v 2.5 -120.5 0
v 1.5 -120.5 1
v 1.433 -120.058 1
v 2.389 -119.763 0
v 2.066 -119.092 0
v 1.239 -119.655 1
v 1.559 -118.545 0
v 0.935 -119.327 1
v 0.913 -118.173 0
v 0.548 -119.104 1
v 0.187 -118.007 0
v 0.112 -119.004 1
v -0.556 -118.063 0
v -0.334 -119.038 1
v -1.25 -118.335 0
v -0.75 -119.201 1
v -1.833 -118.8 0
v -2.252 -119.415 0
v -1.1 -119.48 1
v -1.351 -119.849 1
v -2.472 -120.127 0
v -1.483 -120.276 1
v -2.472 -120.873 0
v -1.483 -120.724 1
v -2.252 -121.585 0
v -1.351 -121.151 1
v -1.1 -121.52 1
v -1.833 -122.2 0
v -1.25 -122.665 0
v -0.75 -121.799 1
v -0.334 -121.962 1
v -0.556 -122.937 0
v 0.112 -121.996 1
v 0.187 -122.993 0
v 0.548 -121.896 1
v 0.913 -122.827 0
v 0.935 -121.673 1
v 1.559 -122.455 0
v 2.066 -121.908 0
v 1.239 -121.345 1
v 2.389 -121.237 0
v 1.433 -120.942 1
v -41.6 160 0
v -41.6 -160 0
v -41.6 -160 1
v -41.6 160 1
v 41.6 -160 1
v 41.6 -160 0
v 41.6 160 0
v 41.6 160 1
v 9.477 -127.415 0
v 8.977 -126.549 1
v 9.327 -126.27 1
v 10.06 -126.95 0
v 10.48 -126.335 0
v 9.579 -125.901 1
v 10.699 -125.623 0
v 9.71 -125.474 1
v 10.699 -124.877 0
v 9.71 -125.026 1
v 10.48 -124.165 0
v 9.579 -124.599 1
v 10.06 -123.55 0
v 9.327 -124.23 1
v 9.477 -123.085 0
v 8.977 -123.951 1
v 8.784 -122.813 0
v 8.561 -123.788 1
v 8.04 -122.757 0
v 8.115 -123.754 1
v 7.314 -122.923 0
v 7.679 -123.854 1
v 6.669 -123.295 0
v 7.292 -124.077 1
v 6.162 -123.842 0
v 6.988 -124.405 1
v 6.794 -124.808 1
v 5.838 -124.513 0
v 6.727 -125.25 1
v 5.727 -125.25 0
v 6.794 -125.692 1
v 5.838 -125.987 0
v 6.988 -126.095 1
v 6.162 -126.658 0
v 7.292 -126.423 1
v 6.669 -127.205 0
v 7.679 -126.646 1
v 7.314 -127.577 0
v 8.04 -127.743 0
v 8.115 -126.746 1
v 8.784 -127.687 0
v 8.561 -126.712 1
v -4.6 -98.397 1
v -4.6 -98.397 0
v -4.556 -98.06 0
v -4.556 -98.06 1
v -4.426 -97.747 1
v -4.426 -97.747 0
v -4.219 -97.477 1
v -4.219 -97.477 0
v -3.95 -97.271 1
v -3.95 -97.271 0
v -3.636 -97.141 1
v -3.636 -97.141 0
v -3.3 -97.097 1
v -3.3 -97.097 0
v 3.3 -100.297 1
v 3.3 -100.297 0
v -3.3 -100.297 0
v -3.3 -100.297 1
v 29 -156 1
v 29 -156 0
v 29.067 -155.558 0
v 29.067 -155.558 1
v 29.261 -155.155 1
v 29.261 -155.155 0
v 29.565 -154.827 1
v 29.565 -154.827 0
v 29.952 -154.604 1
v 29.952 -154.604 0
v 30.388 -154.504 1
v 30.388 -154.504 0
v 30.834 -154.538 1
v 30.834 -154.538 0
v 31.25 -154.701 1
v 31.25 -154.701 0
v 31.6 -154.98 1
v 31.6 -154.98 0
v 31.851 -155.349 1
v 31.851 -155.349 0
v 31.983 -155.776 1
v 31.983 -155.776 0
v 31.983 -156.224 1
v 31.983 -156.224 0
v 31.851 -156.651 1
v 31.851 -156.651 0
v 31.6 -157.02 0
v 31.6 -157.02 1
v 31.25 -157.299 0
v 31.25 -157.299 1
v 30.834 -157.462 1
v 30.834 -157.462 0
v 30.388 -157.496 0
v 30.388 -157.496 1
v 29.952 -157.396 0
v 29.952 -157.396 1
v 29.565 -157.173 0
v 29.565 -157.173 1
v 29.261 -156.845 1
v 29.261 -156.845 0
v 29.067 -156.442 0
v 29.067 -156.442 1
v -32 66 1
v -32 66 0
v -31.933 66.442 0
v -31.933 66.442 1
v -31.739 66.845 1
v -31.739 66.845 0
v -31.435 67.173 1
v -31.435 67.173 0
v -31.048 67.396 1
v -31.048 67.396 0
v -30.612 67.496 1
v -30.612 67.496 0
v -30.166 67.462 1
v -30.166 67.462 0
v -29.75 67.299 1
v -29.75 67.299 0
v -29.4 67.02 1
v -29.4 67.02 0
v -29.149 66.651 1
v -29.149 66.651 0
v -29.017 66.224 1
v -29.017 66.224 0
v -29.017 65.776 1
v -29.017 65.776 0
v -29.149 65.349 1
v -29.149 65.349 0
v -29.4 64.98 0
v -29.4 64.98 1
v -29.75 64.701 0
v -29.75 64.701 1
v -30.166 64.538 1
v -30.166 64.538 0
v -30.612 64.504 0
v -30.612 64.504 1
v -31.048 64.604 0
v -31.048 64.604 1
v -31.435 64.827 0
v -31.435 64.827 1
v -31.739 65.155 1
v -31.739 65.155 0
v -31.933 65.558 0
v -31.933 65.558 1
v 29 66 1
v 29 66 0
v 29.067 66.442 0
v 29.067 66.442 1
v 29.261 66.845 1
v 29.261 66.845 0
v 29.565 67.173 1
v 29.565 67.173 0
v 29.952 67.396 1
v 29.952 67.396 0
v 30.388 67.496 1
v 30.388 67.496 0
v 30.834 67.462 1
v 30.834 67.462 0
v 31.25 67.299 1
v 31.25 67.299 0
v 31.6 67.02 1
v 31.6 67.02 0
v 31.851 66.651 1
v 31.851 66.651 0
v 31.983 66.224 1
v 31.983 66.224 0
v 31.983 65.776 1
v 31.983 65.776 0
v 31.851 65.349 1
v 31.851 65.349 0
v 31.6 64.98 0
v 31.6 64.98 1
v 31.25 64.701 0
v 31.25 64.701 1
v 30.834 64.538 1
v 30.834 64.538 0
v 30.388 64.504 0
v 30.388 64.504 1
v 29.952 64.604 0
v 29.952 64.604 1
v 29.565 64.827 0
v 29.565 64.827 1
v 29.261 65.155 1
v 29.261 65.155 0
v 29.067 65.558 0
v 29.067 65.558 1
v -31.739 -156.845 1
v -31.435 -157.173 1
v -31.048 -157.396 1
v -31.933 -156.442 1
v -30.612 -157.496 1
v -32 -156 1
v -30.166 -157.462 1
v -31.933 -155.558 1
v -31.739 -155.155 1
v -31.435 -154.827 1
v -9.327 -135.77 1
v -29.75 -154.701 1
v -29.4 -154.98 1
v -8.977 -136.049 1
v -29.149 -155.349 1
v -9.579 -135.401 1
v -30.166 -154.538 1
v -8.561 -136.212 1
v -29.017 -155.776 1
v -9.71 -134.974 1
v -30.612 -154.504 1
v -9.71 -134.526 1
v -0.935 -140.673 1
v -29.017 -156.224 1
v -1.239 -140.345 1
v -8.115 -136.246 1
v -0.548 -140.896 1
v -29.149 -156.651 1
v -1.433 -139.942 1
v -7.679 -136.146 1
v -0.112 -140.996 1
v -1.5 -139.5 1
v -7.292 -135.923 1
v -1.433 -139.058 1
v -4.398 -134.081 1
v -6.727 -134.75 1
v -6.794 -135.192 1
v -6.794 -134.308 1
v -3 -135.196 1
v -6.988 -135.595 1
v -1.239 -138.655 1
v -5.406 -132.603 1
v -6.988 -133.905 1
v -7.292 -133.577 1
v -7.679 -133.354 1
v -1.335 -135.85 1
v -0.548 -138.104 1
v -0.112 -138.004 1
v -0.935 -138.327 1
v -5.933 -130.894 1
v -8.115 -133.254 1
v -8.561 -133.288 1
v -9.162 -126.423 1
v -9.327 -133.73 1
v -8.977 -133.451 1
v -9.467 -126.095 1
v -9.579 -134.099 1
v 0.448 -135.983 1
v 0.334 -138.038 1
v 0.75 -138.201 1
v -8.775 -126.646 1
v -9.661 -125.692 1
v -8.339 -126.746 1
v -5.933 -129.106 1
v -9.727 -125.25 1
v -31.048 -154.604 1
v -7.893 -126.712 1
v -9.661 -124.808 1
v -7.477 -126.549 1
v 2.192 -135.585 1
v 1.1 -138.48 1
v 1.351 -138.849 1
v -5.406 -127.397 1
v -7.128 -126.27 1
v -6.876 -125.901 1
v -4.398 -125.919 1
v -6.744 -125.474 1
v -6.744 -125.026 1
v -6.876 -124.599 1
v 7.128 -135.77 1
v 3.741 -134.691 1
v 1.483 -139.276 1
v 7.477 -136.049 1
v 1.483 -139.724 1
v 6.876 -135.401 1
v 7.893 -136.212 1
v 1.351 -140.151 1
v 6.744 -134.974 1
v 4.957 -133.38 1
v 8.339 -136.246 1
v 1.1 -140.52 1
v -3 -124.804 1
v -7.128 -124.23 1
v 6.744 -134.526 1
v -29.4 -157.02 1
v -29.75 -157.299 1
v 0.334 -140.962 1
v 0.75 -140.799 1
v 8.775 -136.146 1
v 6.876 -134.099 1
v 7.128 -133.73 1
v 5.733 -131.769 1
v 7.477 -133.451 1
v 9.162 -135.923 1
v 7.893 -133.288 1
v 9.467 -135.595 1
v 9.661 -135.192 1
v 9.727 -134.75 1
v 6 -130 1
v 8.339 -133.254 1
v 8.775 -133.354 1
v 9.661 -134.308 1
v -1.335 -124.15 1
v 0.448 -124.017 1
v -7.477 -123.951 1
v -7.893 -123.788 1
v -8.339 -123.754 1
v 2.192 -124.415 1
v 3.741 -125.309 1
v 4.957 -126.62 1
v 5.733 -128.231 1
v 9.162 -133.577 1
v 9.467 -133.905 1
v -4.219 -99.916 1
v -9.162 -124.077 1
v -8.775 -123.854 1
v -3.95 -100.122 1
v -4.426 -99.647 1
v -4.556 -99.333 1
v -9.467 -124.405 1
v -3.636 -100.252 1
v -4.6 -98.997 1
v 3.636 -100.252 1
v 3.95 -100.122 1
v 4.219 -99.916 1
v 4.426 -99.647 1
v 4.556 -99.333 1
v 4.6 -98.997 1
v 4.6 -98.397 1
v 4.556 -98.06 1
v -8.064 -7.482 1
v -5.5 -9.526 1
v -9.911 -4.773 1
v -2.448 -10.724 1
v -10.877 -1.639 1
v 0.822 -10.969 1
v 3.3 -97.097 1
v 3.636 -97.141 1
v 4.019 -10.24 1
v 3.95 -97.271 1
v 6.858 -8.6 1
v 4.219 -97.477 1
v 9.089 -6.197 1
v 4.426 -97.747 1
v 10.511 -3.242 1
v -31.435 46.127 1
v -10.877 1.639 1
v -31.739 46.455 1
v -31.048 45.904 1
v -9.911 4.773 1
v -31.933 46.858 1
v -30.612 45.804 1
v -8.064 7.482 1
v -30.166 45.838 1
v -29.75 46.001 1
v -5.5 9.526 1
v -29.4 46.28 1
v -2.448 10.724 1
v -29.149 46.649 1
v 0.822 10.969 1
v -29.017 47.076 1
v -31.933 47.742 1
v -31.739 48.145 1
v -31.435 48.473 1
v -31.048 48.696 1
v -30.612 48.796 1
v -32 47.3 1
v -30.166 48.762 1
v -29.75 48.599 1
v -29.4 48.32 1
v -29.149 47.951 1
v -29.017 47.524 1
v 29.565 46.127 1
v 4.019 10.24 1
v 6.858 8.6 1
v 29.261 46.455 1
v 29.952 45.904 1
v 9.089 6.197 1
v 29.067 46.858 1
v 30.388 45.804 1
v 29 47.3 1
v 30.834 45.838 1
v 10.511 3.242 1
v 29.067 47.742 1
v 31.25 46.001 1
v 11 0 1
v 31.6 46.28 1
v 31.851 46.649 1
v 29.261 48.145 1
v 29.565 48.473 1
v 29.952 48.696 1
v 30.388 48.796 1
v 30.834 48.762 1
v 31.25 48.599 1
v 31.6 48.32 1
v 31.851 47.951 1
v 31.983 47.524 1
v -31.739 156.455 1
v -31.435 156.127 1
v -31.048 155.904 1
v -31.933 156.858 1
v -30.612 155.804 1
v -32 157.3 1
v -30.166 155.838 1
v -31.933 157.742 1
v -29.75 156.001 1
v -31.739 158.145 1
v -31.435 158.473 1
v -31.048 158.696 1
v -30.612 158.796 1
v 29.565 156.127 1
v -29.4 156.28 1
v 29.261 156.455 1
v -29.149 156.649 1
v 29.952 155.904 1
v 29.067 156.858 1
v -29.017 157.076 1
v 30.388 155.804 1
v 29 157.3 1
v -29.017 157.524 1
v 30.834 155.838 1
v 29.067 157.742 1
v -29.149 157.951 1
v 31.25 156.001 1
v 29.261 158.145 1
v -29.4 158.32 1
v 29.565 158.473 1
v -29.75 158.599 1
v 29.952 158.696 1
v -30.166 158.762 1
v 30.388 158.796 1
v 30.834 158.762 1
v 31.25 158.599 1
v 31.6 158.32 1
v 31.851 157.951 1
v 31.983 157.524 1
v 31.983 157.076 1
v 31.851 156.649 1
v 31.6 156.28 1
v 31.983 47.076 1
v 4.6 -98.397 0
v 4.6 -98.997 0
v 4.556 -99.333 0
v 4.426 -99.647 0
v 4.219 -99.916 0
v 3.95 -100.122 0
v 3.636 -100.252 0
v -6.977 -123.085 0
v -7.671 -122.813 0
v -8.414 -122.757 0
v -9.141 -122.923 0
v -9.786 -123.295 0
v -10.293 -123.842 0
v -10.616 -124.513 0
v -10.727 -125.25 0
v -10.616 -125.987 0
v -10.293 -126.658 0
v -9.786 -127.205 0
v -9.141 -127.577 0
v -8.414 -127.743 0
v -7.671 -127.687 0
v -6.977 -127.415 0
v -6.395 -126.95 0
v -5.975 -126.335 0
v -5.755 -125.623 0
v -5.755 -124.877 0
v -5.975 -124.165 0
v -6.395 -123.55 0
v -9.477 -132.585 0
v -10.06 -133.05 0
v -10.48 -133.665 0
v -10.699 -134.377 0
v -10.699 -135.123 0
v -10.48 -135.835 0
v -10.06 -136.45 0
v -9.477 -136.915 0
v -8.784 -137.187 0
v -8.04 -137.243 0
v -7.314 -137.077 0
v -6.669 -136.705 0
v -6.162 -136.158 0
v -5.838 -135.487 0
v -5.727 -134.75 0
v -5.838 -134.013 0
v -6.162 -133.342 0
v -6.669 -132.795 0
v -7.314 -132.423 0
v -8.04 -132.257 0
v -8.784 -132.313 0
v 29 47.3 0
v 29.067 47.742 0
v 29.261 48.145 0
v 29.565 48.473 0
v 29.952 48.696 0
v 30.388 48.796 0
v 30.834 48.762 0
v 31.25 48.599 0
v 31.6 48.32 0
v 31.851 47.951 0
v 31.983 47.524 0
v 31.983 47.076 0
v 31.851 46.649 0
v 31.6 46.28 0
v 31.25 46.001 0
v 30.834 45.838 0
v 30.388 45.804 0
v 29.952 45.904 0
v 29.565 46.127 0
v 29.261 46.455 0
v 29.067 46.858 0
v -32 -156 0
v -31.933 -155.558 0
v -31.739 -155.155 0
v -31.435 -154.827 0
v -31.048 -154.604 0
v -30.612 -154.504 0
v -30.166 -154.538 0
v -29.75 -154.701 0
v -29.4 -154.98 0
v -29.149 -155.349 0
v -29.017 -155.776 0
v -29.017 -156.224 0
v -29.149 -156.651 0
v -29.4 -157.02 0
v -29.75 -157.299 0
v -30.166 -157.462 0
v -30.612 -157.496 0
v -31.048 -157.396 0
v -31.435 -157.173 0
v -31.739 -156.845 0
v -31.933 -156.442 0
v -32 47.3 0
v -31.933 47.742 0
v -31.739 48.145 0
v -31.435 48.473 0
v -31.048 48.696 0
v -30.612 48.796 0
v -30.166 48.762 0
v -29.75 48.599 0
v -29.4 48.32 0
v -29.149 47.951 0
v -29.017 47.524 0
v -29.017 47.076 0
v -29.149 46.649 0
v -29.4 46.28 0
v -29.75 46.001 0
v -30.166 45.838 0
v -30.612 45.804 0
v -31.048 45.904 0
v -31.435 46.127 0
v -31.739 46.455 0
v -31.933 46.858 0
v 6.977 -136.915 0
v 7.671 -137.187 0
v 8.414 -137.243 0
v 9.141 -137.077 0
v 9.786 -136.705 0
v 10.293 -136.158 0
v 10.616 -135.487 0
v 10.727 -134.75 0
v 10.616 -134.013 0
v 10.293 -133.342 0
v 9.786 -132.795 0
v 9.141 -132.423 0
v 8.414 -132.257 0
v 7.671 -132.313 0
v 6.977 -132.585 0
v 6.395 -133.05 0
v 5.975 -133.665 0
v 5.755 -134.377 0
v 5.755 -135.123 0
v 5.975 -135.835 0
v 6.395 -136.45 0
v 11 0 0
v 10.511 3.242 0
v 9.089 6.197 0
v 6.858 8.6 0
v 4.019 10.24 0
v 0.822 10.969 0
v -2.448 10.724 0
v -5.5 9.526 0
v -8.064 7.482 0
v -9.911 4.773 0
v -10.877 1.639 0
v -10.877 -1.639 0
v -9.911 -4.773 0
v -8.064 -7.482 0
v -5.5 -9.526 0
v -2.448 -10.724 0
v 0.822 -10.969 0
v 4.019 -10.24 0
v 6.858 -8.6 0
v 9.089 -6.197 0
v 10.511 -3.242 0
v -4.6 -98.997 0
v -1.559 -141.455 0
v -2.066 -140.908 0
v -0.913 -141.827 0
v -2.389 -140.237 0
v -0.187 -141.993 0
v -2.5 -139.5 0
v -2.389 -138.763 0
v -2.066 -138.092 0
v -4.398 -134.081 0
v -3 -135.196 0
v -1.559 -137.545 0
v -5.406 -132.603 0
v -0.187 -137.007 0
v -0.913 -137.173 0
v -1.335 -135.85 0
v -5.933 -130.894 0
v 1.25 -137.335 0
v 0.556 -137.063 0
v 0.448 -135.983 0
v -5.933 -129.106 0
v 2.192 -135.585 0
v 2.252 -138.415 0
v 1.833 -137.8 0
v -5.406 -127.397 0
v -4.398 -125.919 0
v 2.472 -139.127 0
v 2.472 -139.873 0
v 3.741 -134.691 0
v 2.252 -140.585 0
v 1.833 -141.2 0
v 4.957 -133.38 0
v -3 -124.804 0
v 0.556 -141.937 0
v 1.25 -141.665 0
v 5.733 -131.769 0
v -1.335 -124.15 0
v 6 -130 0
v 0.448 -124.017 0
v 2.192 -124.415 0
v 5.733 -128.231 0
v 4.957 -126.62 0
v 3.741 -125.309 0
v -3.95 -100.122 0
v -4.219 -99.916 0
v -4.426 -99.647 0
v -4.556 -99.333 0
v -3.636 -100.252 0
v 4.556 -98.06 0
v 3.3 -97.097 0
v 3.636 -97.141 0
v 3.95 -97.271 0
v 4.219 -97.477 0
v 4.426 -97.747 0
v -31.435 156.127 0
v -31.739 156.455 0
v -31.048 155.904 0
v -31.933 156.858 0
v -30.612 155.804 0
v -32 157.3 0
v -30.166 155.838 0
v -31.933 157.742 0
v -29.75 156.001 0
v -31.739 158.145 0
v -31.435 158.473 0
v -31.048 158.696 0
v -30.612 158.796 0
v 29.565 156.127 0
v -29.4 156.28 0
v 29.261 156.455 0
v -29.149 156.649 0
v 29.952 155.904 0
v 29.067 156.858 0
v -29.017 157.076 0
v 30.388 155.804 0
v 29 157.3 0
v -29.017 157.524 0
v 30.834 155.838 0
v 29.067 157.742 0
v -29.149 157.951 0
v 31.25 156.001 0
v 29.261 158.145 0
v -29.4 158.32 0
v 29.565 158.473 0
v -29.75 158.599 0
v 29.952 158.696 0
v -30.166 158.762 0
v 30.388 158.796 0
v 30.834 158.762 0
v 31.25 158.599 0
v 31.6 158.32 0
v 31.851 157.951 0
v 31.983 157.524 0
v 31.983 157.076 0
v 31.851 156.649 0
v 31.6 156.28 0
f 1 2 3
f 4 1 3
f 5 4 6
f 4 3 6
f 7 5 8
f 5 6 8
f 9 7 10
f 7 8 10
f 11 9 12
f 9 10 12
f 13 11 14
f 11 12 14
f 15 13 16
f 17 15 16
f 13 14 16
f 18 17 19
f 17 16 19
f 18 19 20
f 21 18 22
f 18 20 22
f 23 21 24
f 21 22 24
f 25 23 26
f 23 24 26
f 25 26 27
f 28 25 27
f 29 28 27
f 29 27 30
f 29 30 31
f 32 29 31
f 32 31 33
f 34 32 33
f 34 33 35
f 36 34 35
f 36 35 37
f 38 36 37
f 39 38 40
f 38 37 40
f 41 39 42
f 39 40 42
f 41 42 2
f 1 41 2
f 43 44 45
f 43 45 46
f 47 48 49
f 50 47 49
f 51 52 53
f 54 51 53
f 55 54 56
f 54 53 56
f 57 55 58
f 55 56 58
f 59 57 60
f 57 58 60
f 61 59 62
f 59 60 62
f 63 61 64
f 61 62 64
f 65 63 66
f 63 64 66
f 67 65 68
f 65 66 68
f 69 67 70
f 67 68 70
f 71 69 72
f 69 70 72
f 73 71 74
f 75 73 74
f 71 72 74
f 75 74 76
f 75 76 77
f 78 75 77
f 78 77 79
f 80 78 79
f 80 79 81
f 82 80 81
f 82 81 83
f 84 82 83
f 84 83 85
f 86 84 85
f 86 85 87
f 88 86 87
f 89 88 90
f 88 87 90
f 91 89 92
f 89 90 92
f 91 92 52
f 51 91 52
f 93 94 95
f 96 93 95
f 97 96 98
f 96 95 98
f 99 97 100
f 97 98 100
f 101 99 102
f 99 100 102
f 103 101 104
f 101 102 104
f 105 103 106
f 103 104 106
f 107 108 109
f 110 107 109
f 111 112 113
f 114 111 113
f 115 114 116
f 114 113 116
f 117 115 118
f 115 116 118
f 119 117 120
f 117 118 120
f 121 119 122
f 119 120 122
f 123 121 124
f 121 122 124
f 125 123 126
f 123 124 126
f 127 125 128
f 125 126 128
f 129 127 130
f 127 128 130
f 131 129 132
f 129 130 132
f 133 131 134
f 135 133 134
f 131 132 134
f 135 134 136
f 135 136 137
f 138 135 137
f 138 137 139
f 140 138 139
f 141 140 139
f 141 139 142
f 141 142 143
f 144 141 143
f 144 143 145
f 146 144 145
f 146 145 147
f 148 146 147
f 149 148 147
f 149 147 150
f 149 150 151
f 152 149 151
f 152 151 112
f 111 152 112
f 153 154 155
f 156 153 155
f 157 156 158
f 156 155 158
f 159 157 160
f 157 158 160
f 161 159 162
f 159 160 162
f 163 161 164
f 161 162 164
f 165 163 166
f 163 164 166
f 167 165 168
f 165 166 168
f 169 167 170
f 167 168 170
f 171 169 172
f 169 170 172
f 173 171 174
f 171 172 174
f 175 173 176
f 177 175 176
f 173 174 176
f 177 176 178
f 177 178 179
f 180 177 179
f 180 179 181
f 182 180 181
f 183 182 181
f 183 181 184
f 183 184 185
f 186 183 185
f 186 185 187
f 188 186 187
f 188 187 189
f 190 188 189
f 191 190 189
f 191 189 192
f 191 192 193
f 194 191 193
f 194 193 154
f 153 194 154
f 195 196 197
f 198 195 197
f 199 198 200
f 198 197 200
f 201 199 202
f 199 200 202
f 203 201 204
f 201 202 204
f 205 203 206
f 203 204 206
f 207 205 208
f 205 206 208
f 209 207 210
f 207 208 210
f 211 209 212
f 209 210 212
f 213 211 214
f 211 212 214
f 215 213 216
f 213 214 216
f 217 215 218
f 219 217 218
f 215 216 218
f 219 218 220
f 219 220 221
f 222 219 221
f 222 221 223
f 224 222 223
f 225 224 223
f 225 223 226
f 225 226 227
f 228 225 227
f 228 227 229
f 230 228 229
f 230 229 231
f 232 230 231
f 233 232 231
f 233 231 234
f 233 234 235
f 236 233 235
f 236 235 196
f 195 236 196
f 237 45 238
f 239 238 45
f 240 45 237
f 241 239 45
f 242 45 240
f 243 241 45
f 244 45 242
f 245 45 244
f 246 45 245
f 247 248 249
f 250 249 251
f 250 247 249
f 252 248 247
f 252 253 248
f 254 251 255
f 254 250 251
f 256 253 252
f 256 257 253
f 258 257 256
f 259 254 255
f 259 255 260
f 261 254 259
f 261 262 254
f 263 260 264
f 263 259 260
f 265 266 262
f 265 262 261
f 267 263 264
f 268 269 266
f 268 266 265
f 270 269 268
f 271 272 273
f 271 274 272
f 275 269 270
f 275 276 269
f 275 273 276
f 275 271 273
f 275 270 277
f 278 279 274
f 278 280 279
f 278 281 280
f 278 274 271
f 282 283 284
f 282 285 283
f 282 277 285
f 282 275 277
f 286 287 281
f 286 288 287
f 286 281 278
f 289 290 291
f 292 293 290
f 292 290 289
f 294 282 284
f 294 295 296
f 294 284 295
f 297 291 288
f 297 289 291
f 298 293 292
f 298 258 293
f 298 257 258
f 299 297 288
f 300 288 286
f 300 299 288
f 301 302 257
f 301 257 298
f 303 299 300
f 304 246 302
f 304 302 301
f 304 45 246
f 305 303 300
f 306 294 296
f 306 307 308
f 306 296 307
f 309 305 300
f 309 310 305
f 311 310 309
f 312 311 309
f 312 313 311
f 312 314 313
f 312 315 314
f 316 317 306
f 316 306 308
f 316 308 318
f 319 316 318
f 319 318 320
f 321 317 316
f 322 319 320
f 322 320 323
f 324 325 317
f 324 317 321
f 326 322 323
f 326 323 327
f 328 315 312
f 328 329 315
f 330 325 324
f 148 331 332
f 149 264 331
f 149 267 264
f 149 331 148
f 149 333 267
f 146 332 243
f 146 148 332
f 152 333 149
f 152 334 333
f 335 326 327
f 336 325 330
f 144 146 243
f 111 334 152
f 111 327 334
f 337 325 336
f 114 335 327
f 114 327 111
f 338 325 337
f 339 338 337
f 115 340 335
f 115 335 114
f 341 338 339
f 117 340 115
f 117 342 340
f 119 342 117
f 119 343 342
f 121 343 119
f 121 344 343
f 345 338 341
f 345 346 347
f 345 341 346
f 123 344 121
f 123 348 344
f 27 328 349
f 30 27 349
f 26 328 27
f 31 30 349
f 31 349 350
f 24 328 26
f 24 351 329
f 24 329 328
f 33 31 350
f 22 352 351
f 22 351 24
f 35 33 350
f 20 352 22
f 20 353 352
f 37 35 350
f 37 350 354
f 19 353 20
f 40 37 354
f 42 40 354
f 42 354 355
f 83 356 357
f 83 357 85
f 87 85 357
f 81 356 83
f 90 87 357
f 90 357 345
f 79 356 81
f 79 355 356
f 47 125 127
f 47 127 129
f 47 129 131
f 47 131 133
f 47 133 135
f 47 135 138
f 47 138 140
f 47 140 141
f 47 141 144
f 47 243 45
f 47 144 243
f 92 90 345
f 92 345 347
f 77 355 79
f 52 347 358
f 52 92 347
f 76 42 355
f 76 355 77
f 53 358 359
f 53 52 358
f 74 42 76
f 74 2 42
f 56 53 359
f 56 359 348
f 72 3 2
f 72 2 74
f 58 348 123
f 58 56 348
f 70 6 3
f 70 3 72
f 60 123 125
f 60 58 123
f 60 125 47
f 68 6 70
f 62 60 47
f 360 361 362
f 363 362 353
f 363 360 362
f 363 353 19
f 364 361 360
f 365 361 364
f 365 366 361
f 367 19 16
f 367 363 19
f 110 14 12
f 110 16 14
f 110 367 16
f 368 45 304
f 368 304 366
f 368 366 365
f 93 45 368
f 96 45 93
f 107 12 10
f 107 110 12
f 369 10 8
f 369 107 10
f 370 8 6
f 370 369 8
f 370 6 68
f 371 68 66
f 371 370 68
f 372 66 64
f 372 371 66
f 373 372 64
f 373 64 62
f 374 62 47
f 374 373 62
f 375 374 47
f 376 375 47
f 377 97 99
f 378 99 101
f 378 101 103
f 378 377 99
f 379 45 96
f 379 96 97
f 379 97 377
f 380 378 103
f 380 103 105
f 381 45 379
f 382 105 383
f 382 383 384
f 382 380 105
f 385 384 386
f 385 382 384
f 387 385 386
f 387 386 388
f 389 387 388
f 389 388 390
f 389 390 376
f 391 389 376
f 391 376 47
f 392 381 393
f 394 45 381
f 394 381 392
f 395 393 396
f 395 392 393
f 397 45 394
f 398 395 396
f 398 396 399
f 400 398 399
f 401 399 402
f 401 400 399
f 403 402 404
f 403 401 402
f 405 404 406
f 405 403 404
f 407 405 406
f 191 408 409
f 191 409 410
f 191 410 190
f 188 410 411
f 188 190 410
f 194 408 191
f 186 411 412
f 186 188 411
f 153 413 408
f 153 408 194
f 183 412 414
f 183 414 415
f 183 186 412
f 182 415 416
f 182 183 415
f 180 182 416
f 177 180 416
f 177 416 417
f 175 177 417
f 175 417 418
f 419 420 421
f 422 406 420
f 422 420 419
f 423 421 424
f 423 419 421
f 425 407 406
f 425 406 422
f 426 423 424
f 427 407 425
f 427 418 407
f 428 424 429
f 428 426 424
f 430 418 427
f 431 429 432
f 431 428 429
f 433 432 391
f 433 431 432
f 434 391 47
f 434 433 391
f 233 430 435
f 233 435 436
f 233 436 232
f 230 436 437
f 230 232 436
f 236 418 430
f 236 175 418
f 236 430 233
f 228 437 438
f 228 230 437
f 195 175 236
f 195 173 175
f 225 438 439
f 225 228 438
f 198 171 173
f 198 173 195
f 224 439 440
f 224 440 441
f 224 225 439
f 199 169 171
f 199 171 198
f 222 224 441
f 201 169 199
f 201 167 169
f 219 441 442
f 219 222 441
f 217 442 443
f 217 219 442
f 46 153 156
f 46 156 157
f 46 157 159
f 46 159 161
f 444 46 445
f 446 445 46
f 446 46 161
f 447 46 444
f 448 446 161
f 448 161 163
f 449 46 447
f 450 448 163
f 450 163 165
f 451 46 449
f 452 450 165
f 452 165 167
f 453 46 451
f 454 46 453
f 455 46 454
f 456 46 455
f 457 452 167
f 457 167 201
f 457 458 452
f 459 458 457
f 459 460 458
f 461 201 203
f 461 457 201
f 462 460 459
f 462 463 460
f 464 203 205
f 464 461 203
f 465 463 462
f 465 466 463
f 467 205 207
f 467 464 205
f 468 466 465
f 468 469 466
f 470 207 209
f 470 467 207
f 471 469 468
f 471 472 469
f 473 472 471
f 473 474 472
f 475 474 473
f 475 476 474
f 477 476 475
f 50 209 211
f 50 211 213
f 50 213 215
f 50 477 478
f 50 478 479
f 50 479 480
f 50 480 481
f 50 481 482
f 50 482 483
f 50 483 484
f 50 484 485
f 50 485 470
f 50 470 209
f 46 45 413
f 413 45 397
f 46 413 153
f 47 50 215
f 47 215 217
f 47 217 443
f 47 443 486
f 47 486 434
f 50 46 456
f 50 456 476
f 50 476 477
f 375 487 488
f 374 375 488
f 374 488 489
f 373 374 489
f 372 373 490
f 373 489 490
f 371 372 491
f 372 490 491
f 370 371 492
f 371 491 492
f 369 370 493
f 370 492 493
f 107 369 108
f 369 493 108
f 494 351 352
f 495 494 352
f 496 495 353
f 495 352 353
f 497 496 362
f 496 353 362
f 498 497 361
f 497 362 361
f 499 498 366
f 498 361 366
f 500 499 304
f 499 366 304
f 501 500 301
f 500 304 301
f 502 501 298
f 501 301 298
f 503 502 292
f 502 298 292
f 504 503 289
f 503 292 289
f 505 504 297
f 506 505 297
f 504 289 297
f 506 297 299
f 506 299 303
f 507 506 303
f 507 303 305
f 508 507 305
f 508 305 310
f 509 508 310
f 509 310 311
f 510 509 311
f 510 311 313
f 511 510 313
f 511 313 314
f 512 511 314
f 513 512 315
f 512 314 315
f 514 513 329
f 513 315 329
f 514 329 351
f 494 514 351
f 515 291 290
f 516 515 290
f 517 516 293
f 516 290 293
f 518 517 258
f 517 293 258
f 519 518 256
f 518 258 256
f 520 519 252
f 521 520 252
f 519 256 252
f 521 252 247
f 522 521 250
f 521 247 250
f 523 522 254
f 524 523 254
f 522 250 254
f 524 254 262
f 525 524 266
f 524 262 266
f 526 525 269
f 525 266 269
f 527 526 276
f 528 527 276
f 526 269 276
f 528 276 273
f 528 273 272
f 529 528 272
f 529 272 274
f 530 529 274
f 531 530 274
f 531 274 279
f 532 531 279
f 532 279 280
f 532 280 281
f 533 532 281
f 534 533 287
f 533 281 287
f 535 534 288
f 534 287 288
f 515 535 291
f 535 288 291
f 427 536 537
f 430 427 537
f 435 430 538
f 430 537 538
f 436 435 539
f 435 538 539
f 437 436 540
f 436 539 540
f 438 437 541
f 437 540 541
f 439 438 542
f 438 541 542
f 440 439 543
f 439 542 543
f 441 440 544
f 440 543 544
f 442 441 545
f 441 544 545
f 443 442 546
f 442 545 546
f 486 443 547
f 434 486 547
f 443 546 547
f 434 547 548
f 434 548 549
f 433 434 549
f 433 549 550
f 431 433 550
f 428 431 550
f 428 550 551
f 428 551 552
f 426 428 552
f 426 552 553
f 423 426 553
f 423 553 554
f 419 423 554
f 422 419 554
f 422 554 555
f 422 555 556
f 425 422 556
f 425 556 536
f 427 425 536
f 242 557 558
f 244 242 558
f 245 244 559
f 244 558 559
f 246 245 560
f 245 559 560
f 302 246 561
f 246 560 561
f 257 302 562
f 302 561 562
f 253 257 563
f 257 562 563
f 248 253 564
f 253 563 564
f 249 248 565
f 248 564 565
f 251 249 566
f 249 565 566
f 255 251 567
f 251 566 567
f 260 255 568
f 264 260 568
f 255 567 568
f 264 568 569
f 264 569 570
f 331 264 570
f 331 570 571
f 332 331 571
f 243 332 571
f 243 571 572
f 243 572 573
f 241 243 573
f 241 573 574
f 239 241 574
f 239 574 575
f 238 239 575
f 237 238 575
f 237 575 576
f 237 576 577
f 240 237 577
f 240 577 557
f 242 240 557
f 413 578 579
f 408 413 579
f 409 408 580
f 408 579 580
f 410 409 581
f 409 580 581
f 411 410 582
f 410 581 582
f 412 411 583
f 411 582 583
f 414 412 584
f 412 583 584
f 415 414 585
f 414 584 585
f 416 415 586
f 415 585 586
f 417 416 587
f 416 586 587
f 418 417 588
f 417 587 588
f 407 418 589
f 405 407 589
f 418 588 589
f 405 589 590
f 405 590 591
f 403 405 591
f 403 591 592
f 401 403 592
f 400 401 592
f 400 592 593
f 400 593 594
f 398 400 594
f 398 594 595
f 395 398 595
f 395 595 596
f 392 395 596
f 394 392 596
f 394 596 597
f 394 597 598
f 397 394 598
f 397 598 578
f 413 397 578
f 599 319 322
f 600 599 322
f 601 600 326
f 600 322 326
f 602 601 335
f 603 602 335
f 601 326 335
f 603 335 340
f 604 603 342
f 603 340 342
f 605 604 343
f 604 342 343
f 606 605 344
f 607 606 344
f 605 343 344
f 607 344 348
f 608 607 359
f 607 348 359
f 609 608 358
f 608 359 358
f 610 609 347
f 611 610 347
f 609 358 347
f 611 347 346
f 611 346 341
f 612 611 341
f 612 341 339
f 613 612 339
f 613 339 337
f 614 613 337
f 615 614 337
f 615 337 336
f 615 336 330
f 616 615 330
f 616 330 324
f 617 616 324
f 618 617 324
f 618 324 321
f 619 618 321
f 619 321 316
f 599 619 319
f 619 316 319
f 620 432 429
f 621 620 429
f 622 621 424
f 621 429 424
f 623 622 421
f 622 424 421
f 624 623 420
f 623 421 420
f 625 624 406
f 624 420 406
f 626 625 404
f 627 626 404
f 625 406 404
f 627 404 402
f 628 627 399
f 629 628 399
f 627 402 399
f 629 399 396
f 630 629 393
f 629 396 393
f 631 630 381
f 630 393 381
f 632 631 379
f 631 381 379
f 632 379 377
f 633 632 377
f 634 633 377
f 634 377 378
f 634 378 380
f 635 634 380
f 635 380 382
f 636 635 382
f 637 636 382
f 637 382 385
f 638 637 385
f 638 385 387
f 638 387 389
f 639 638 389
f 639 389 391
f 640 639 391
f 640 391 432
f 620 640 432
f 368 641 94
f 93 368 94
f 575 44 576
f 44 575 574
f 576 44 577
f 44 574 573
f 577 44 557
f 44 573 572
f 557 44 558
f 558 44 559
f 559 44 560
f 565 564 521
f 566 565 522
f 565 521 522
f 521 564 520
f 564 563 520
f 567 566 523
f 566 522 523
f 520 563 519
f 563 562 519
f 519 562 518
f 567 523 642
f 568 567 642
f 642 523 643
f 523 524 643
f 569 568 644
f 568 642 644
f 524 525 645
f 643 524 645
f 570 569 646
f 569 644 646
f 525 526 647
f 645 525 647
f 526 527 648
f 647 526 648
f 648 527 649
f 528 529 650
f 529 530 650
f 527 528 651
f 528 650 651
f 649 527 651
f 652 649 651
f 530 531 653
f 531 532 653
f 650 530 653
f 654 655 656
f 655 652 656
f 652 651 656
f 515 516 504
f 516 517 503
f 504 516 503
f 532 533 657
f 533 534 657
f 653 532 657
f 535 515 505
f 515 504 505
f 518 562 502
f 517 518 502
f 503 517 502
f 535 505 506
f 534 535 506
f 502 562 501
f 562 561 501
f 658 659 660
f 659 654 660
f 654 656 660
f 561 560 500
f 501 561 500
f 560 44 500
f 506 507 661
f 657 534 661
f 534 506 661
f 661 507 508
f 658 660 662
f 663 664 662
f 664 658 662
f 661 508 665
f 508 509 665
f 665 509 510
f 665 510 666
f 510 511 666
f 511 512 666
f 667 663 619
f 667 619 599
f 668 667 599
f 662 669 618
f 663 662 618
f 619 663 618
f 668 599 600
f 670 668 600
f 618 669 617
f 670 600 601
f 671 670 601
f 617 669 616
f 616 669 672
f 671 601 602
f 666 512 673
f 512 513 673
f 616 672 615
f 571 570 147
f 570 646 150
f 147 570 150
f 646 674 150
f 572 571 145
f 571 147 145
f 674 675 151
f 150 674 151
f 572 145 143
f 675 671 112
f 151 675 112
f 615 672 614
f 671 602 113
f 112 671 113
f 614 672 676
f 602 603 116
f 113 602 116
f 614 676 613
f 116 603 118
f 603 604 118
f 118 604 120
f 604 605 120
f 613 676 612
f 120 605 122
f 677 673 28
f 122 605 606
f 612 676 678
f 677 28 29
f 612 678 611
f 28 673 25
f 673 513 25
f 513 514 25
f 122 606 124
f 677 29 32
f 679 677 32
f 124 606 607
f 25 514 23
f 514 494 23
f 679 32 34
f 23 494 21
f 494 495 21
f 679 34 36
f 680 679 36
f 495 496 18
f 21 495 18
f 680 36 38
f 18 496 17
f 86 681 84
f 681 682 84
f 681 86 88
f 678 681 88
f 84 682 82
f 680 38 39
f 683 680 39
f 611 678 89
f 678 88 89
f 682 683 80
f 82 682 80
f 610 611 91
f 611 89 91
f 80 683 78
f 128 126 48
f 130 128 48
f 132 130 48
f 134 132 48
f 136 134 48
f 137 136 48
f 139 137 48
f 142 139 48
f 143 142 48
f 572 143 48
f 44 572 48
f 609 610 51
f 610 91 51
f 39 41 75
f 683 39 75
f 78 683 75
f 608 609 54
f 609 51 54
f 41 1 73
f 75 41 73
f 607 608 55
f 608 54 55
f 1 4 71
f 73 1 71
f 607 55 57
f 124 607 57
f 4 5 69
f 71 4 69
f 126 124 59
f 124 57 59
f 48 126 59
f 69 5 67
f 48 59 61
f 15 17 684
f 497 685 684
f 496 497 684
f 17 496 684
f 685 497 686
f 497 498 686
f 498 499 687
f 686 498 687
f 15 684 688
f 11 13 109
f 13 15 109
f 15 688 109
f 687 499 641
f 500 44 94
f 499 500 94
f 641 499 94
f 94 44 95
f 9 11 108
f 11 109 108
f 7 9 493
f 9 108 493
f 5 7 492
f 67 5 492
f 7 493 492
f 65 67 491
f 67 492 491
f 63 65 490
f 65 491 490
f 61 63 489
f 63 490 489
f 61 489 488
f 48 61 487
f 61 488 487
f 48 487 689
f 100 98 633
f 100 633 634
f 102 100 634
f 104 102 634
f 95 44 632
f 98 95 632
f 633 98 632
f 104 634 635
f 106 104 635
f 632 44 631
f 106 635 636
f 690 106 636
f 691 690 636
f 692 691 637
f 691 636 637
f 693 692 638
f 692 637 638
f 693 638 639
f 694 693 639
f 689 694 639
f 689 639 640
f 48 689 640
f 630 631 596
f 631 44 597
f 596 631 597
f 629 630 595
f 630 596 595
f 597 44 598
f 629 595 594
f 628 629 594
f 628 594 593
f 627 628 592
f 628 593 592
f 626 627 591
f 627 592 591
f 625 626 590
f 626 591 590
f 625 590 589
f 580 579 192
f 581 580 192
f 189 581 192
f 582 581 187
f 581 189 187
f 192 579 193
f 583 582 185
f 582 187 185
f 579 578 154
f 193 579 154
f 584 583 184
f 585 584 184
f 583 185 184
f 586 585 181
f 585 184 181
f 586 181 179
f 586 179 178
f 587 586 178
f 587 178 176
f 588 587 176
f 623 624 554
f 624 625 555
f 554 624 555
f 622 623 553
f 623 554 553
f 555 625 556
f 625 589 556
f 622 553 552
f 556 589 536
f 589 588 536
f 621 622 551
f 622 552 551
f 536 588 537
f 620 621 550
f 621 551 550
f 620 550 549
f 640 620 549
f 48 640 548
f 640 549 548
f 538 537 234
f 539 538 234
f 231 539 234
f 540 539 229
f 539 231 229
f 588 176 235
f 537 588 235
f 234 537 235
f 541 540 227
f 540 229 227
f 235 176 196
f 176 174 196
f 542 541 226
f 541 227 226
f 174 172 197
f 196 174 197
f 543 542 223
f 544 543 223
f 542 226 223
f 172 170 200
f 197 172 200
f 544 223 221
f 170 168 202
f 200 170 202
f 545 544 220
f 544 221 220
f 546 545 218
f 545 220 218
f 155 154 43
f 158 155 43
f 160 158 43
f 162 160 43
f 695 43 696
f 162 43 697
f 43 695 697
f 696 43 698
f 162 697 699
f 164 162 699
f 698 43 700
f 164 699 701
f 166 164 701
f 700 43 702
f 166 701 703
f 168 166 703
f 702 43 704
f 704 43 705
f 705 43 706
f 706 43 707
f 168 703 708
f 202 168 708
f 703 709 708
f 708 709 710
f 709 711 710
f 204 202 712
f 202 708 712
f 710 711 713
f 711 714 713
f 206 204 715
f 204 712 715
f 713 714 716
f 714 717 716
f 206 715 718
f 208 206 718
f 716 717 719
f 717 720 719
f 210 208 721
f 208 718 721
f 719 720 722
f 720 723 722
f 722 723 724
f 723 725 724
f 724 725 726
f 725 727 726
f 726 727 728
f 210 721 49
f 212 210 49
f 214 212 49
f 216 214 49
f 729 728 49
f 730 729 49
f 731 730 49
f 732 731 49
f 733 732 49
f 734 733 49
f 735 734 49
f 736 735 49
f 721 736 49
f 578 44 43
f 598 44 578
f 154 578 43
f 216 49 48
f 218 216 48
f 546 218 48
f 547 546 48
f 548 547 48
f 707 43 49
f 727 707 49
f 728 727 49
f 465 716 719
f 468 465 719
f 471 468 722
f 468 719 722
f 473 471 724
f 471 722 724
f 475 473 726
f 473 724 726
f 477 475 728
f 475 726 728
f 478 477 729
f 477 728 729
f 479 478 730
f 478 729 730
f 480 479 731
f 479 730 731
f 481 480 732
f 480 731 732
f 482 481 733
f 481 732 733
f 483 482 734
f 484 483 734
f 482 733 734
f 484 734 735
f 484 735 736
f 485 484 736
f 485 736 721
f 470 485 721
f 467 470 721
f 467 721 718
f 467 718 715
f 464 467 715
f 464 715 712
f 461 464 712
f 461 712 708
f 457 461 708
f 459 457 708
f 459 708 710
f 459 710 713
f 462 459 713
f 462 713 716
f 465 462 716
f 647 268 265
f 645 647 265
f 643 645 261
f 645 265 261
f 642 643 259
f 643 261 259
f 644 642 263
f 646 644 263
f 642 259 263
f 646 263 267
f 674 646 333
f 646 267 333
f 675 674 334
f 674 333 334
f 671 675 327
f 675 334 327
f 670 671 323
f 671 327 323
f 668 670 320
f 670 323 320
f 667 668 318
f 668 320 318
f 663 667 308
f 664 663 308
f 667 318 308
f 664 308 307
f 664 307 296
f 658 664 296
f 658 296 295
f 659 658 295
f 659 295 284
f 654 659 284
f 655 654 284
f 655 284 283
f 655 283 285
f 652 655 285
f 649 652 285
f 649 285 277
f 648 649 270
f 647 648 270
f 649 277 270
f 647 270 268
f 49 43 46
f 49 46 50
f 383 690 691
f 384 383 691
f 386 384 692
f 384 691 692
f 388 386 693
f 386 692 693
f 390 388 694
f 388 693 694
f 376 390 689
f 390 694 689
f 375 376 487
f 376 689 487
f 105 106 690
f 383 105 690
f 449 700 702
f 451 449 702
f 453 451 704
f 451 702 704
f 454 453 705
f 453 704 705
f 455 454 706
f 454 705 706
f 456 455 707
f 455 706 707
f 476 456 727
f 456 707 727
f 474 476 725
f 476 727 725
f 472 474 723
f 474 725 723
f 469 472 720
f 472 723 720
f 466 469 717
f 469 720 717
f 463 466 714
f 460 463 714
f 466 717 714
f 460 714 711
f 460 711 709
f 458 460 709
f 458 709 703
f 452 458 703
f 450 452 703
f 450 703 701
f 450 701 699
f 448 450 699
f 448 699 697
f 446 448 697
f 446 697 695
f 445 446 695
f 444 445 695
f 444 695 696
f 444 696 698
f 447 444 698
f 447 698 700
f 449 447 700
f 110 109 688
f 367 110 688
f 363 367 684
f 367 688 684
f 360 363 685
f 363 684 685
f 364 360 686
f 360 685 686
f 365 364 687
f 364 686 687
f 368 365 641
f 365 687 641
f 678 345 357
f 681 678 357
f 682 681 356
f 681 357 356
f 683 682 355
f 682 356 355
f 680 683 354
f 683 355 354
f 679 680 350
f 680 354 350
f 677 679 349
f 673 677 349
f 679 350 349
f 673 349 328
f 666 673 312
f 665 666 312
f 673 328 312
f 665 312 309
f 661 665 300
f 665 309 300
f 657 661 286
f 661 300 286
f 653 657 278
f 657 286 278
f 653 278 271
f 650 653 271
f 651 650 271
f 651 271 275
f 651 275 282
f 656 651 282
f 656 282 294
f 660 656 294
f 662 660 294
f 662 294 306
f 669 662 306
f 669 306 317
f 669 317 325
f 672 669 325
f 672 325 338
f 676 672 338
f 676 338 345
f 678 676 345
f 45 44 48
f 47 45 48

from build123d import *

# Parameters (mm, degrees)
SKETCH1_W                            = 83.2
SKETCH1_H                            = 320
BOSS_EXTRUDE1_DEPTH                  = 1
F_3_0_3_DIAMETER_HOLE1_D             = 3
SKETCH_1_R                           = 11
CUT_EXTRUDE_1_DEPTH                  = 166.322593737
SKETCH_2_R                           = 6
CUT_EXTRUDE_2_DEPTH                  = 10
SKETCH_3_R                           = 1.5
CUT_EXTRUDE_3_DEPTH                  = 10
CHAMFER_1_SIZE                       = 1
PATTERN_CIRCULAR_1_COUNT             = 6
CHAMFER_1_OF_PATTERN_CIRCULAR_1_SIZE = 1
CUT_EXTRUDE_4_DEPTH                  = 10


with BuildPart() as part:
    # Sketch1 → Boss-Extrude1 (new body)
    with BuildSketch(Plane.XY):
        Rectangle(SKETCH1_W, SKETCH1_H)
    extrude(amount=BOSS_EXTRUDE1_DEPTH)

    # Ø3.0 (3) Diameter Hole1 (through all)
    with Locations(Plane.XY.offset(1)):
        with Locations((-30.5, 66), (30.5, 66), (30.5, -156), (-30.5, -156), (-30.5, 157.3), (30.5, 157.3), (-30.5, 47.3), (30.5, 47.3)):
            Hole(F_3_0_3_DIAMETER_HOLE1_D / 2)

    # Эскиз1 → Вырез-Вытянуть1 (cut, through all)
    with BuildSketch(Plane.XY.offset(1)):
        Circle(SKETCH_1_R)
    extrude(amount=-CUT_EXTRUDE_1_DEPTH, mode=Mode.SUBTRACT)

    # Эскиз2 → Вырез-Вытянуть2 (cut)
    with BuildSketch(Plane.XY.offset(1)):
        with Locations((0, -130)):
            Circle(SKETCH_2_R)
    extrude(amount=-CUT_EXTRUDE_2_DEPTH, mode=Mode.SUBTRACT)

    # Эскиз3 → Вырез-Вытянуть3 (cut)
    with BuildSketch(Plane.XY.offset(1)):
        with Locations((0, -120.5)):
            Circle(SKETCH_3_R)
    cut_extrude_3 = extrude(amount=-CUT_EXTRUDE_3_DEPTH, mode=Mode.SUBTRACT)

    # Фаска1
    chamfer_1_edges = [part.edges().sort_by_distance(p)[0] for p in [
        (-1.5, -120.5, 0),
    ]]
    chamfer(chamfer_1_edges, length=CHAMFER_1_SIZE - 0.0001)  # a hair under: the kernel refuses the full size

    # Круговой массив1: Вырез-Вытянуть3 ×6 about axis
    pattern_circular_1_axis = Axis((0, -130, 0), (0, 0, 1))
    for i in range(1, PATTERN_CIRCULAR_1_COUNT):
        add(cut_extrude_3.rotate(pattern_circular_1_axis, i * 360 / PATTERN_CIRCULAR_1_COUNT), mode=Mode.SUBTRACT)

    # Фаска1 of Круговой массив1
    chamfer_1_of_pattern_circular_1_edges = [part.edges().sort_by_distance(p)[0] for p in [
        (-8.977241336, -126.549038106, 0),
        (-7.477241336, -136.049038106, 0),
        (1.5, -139.5, 0),
        (8.977241336, -133.450961894, 0),
        (7.477241336, -123.950961894, 0),
    ]]
    chamfer(chamfer_1_of_pattern_circular_1_edges, length=CHAMFER_1_OF_PATTERN_CIRCULAR_1_SIZE - 0.0001)  # a hair under: the kernel refuses the full size

    # Эскиз4 → Вырез-Вытянуть4 (cut)
    with BuildSketch(Plane(origin=(0, 0, 0), x_dir=(-1, 0, 0), z_dir=(0, 0, -1))):
        with BuildLine():
            Line((-3.3, -100.29662602), (3.3, -100.29662602))
            ThreePointArc((3.3, -100.29662602), (4.219238816, -99.915864836), (4.6, -98.99662602))
            Line((4.6, -98.99662602), (4.6, -98.39662602))
            ThreePointArc((4.6, -98.39662602), (4.219238816, -97.477387205), (3.3, -97.09662602))
            Line((3.3, -97.09662602), (-3.3, -97.09662602))
            ThreePointArc((-3.3, -97.09662602), (-4.219238816, -97.477387205), (-4.6, -98.39662602))
            Line((-4.6, -98.39662602), (-4.6, -98.99662602))
            ThreePointArc((-4.6, -98.99662602), (-4.219238816, -99.915864836), (-3.3, -100.29662602))
        make_face()
    extrude(amount=-CUT_EXTRUDE_4_DEPTH, mode=Mode.SUBTRACT)


solid = part.part
